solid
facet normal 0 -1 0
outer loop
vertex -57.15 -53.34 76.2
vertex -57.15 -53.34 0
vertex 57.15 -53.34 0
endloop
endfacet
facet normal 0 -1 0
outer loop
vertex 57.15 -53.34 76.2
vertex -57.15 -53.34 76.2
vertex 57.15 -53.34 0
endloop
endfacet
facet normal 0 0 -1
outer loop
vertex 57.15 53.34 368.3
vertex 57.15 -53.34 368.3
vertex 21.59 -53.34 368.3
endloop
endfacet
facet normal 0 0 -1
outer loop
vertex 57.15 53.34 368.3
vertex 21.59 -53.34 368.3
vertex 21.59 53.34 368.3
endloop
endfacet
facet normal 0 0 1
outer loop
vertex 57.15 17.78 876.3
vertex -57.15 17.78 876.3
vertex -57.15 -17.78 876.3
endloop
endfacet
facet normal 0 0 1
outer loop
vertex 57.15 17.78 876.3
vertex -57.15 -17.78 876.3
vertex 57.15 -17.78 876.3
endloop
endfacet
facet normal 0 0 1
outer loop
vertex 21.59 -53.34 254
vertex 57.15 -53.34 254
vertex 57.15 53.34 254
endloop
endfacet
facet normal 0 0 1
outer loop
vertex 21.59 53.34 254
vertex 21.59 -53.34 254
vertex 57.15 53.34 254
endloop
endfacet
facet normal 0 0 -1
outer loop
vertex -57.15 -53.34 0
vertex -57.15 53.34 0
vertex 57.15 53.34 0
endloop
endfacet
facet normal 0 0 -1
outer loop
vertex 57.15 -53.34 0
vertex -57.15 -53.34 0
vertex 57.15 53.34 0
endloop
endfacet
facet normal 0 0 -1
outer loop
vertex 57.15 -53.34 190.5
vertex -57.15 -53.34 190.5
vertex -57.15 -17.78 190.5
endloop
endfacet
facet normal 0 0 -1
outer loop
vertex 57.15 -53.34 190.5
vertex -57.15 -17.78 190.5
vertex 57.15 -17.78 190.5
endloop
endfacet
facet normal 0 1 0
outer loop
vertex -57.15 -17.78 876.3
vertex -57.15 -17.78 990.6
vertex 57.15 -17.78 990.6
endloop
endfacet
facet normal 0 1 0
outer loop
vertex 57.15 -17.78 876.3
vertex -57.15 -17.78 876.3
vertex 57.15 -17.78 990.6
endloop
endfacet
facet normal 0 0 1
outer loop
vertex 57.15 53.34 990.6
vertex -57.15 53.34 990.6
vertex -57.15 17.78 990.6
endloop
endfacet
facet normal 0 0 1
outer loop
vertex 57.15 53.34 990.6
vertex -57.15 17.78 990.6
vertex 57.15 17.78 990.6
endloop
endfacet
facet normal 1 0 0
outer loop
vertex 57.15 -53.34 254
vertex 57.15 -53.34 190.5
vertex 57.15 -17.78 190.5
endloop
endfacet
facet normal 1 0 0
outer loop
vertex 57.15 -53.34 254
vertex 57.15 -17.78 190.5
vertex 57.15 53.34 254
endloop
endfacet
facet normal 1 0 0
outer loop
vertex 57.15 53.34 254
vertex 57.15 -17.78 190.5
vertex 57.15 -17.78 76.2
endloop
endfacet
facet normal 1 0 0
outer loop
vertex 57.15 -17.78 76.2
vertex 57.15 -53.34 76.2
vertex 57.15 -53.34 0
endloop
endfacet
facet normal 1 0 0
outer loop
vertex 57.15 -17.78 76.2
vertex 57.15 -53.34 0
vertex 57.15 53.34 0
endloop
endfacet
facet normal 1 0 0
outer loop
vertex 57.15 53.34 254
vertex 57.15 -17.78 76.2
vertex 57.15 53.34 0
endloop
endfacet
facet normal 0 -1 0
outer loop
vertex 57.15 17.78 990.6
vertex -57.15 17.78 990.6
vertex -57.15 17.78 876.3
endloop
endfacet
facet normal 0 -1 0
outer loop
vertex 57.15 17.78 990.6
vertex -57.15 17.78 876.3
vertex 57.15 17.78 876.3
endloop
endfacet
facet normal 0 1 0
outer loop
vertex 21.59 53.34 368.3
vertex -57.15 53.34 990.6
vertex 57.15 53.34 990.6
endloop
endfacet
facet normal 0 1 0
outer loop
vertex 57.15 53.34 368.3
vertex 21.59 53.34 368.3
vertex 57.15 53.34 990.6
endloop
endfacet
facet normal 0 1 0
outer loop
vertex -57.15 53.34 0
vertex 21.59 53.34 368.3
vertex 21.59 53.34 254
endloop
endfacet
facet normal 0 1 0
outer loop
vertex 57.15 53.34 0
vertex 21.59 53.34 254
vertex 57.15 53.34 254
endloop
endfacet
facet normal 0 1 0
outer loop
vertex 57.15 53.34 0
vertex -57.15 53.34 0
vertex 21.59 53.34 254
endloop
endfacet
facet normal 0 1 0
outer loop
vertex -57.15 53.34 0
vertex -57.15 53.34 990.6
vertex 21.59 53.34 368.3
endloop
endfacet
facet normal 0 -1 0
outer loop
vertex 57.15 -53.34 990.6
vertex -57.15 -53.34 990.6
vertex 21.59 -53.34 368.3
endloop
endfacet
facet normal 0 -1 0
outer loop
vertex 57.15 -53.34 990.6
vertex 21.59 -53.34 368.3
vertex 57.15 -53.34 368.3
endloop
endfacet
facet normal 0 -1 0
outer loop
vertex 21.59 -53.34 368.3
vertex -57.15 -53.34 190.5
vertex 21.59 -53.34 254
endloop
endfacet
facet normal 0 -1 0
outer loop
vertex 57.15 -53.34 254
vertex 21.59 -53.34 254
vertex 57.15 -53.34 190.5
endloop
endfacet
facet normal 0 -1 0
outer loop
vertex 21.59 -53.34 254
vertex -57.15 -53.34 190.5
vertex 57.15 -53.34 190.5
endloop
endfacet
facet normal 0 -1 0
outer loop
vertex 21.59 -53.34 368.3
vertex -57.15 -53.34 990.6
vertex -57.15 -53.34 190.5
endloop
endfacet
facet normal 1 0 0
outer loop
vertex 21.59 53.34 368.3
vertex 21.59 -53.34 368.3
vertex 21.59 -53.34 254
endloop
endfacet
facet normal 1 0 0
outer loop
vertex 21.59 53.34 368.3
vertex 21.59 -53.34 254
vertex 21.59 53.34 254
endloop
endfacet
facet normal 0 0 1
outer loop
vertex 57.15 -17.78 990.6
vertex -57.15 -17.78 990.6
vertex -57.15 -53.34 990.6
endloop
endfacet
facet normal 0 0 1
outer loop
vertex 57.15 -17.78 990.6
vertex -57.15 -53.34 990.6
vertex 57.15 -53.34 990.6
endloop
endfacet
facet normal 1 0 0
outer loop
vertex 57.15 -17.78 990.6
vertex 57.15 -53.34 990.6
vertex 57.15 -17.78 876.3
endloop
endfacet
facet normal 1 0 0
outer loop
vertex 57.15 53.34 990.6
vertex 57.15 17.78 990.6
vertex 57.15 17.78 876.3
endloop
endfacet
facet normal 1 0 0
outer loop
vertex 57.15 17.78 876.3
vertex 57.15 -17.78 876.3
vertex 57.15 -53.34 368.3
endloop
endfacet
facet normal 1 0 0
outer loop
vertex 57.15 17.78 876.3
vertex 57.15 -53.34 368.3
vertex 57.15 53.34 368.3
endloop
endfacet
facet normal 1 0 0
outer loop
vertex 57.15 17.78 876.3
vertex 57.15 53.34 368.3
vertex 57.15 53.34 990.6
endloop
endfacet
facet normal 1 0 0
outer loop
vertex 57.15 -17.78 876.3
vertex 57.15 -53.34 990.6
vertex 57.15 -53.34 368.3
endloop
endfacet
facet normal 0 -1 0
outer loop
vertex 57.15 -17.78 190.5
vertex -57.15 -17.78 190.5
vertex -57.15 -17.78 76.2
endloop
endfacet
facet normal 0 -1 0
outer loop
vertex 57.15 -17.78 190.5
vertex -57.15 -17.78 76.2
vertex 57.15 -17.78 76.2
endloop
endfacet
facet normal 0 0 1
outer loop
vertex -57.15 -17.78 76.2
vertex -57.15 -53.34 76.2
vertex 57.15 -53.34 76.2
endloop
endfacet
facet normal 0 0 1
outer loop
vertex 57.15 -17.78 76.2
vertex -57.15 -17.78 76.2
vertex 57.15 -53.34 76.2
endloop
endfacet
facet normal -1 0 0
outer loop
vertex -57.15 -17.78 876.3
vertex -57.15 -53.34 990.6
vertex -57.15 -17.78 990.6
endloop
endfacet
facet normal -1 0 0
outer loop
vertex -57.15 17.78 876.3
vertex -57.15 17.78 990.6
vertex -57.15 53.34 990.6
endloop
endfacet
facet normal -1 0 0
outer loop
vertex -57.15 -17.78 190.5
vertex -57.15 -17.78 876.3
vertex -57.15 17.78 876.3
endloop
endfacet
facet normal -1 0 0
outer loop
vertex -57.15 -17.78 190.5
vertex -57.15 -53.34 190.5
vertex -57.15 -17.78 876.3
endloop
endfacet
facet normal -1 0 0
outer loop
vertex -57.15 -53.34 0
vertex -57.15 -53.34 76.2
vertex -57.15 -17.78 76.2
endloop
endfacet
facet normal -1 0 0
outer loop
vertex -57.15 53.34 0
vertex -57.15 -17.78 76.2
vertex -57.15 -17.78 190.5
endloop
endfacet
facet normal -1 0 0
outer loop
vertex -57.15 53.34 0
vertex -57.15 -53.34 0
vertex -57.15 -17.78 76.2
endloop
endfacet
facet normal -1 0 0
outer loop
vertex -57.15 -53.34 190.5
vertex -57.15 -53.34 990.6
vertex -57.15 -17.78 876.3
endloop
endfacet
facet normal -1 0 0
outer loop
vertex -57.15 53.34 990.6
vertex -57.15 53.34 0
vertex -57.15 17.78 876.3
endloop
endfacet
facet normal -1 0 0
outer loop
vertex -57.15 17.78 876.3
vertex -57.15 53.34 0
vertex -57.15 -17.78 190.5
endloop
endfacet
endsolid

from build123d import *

# Parameters (mm, degrees)
F0_W     = 114.3
F0_H     = 106.68
F1_DEPTH = 990.6
F2_W     = 114.3
F2_H     = 35.56
F3_DEPTH = 114.3
F4_W     = 114.3
F4_H     = 114.3
F5_DEPTH = 35.56
F6_W     = 106.68
F6_H     = 114.3
F7_DEPTH = 35.56


with BuildPart() as f1:
    # F0 (on Top) → F1 (new body)
    with BuildSketch(Plane.XY):
        Rectangle(F0_W, F0_H)
    extrude(amount=F1_DEPTH)

    # F2 (on face) → F3 (cut)
    with BuildSketch(Plane.XY.offset(990.6)):
        Rectangle(F2_W, F2_H)
    extrude(amount=-F3_DEPTH, mode=Mode.SUBTRACT)

    # F4 (on face) → F5 (cut)
    with BuildSketch(Plane.XZ.offset(53.34)):
        with Locations((0, 133.35)):
            Rectangle(F4_W, F4_H)
    extrude(amount=-F5_DEPTH, mode=Mode.SUBTRACT)

    # F6 (on face) → F7 (cut)
    with BuildSketch(Plane.YZ.offset(57.15)):
        with Locations((0, 311.15)):
            Rectangle(F6_W, F6_H)
    extrude(amount=-F7_DEPTH, mode=Mode.SUBTRACT)


solid = f1.part
